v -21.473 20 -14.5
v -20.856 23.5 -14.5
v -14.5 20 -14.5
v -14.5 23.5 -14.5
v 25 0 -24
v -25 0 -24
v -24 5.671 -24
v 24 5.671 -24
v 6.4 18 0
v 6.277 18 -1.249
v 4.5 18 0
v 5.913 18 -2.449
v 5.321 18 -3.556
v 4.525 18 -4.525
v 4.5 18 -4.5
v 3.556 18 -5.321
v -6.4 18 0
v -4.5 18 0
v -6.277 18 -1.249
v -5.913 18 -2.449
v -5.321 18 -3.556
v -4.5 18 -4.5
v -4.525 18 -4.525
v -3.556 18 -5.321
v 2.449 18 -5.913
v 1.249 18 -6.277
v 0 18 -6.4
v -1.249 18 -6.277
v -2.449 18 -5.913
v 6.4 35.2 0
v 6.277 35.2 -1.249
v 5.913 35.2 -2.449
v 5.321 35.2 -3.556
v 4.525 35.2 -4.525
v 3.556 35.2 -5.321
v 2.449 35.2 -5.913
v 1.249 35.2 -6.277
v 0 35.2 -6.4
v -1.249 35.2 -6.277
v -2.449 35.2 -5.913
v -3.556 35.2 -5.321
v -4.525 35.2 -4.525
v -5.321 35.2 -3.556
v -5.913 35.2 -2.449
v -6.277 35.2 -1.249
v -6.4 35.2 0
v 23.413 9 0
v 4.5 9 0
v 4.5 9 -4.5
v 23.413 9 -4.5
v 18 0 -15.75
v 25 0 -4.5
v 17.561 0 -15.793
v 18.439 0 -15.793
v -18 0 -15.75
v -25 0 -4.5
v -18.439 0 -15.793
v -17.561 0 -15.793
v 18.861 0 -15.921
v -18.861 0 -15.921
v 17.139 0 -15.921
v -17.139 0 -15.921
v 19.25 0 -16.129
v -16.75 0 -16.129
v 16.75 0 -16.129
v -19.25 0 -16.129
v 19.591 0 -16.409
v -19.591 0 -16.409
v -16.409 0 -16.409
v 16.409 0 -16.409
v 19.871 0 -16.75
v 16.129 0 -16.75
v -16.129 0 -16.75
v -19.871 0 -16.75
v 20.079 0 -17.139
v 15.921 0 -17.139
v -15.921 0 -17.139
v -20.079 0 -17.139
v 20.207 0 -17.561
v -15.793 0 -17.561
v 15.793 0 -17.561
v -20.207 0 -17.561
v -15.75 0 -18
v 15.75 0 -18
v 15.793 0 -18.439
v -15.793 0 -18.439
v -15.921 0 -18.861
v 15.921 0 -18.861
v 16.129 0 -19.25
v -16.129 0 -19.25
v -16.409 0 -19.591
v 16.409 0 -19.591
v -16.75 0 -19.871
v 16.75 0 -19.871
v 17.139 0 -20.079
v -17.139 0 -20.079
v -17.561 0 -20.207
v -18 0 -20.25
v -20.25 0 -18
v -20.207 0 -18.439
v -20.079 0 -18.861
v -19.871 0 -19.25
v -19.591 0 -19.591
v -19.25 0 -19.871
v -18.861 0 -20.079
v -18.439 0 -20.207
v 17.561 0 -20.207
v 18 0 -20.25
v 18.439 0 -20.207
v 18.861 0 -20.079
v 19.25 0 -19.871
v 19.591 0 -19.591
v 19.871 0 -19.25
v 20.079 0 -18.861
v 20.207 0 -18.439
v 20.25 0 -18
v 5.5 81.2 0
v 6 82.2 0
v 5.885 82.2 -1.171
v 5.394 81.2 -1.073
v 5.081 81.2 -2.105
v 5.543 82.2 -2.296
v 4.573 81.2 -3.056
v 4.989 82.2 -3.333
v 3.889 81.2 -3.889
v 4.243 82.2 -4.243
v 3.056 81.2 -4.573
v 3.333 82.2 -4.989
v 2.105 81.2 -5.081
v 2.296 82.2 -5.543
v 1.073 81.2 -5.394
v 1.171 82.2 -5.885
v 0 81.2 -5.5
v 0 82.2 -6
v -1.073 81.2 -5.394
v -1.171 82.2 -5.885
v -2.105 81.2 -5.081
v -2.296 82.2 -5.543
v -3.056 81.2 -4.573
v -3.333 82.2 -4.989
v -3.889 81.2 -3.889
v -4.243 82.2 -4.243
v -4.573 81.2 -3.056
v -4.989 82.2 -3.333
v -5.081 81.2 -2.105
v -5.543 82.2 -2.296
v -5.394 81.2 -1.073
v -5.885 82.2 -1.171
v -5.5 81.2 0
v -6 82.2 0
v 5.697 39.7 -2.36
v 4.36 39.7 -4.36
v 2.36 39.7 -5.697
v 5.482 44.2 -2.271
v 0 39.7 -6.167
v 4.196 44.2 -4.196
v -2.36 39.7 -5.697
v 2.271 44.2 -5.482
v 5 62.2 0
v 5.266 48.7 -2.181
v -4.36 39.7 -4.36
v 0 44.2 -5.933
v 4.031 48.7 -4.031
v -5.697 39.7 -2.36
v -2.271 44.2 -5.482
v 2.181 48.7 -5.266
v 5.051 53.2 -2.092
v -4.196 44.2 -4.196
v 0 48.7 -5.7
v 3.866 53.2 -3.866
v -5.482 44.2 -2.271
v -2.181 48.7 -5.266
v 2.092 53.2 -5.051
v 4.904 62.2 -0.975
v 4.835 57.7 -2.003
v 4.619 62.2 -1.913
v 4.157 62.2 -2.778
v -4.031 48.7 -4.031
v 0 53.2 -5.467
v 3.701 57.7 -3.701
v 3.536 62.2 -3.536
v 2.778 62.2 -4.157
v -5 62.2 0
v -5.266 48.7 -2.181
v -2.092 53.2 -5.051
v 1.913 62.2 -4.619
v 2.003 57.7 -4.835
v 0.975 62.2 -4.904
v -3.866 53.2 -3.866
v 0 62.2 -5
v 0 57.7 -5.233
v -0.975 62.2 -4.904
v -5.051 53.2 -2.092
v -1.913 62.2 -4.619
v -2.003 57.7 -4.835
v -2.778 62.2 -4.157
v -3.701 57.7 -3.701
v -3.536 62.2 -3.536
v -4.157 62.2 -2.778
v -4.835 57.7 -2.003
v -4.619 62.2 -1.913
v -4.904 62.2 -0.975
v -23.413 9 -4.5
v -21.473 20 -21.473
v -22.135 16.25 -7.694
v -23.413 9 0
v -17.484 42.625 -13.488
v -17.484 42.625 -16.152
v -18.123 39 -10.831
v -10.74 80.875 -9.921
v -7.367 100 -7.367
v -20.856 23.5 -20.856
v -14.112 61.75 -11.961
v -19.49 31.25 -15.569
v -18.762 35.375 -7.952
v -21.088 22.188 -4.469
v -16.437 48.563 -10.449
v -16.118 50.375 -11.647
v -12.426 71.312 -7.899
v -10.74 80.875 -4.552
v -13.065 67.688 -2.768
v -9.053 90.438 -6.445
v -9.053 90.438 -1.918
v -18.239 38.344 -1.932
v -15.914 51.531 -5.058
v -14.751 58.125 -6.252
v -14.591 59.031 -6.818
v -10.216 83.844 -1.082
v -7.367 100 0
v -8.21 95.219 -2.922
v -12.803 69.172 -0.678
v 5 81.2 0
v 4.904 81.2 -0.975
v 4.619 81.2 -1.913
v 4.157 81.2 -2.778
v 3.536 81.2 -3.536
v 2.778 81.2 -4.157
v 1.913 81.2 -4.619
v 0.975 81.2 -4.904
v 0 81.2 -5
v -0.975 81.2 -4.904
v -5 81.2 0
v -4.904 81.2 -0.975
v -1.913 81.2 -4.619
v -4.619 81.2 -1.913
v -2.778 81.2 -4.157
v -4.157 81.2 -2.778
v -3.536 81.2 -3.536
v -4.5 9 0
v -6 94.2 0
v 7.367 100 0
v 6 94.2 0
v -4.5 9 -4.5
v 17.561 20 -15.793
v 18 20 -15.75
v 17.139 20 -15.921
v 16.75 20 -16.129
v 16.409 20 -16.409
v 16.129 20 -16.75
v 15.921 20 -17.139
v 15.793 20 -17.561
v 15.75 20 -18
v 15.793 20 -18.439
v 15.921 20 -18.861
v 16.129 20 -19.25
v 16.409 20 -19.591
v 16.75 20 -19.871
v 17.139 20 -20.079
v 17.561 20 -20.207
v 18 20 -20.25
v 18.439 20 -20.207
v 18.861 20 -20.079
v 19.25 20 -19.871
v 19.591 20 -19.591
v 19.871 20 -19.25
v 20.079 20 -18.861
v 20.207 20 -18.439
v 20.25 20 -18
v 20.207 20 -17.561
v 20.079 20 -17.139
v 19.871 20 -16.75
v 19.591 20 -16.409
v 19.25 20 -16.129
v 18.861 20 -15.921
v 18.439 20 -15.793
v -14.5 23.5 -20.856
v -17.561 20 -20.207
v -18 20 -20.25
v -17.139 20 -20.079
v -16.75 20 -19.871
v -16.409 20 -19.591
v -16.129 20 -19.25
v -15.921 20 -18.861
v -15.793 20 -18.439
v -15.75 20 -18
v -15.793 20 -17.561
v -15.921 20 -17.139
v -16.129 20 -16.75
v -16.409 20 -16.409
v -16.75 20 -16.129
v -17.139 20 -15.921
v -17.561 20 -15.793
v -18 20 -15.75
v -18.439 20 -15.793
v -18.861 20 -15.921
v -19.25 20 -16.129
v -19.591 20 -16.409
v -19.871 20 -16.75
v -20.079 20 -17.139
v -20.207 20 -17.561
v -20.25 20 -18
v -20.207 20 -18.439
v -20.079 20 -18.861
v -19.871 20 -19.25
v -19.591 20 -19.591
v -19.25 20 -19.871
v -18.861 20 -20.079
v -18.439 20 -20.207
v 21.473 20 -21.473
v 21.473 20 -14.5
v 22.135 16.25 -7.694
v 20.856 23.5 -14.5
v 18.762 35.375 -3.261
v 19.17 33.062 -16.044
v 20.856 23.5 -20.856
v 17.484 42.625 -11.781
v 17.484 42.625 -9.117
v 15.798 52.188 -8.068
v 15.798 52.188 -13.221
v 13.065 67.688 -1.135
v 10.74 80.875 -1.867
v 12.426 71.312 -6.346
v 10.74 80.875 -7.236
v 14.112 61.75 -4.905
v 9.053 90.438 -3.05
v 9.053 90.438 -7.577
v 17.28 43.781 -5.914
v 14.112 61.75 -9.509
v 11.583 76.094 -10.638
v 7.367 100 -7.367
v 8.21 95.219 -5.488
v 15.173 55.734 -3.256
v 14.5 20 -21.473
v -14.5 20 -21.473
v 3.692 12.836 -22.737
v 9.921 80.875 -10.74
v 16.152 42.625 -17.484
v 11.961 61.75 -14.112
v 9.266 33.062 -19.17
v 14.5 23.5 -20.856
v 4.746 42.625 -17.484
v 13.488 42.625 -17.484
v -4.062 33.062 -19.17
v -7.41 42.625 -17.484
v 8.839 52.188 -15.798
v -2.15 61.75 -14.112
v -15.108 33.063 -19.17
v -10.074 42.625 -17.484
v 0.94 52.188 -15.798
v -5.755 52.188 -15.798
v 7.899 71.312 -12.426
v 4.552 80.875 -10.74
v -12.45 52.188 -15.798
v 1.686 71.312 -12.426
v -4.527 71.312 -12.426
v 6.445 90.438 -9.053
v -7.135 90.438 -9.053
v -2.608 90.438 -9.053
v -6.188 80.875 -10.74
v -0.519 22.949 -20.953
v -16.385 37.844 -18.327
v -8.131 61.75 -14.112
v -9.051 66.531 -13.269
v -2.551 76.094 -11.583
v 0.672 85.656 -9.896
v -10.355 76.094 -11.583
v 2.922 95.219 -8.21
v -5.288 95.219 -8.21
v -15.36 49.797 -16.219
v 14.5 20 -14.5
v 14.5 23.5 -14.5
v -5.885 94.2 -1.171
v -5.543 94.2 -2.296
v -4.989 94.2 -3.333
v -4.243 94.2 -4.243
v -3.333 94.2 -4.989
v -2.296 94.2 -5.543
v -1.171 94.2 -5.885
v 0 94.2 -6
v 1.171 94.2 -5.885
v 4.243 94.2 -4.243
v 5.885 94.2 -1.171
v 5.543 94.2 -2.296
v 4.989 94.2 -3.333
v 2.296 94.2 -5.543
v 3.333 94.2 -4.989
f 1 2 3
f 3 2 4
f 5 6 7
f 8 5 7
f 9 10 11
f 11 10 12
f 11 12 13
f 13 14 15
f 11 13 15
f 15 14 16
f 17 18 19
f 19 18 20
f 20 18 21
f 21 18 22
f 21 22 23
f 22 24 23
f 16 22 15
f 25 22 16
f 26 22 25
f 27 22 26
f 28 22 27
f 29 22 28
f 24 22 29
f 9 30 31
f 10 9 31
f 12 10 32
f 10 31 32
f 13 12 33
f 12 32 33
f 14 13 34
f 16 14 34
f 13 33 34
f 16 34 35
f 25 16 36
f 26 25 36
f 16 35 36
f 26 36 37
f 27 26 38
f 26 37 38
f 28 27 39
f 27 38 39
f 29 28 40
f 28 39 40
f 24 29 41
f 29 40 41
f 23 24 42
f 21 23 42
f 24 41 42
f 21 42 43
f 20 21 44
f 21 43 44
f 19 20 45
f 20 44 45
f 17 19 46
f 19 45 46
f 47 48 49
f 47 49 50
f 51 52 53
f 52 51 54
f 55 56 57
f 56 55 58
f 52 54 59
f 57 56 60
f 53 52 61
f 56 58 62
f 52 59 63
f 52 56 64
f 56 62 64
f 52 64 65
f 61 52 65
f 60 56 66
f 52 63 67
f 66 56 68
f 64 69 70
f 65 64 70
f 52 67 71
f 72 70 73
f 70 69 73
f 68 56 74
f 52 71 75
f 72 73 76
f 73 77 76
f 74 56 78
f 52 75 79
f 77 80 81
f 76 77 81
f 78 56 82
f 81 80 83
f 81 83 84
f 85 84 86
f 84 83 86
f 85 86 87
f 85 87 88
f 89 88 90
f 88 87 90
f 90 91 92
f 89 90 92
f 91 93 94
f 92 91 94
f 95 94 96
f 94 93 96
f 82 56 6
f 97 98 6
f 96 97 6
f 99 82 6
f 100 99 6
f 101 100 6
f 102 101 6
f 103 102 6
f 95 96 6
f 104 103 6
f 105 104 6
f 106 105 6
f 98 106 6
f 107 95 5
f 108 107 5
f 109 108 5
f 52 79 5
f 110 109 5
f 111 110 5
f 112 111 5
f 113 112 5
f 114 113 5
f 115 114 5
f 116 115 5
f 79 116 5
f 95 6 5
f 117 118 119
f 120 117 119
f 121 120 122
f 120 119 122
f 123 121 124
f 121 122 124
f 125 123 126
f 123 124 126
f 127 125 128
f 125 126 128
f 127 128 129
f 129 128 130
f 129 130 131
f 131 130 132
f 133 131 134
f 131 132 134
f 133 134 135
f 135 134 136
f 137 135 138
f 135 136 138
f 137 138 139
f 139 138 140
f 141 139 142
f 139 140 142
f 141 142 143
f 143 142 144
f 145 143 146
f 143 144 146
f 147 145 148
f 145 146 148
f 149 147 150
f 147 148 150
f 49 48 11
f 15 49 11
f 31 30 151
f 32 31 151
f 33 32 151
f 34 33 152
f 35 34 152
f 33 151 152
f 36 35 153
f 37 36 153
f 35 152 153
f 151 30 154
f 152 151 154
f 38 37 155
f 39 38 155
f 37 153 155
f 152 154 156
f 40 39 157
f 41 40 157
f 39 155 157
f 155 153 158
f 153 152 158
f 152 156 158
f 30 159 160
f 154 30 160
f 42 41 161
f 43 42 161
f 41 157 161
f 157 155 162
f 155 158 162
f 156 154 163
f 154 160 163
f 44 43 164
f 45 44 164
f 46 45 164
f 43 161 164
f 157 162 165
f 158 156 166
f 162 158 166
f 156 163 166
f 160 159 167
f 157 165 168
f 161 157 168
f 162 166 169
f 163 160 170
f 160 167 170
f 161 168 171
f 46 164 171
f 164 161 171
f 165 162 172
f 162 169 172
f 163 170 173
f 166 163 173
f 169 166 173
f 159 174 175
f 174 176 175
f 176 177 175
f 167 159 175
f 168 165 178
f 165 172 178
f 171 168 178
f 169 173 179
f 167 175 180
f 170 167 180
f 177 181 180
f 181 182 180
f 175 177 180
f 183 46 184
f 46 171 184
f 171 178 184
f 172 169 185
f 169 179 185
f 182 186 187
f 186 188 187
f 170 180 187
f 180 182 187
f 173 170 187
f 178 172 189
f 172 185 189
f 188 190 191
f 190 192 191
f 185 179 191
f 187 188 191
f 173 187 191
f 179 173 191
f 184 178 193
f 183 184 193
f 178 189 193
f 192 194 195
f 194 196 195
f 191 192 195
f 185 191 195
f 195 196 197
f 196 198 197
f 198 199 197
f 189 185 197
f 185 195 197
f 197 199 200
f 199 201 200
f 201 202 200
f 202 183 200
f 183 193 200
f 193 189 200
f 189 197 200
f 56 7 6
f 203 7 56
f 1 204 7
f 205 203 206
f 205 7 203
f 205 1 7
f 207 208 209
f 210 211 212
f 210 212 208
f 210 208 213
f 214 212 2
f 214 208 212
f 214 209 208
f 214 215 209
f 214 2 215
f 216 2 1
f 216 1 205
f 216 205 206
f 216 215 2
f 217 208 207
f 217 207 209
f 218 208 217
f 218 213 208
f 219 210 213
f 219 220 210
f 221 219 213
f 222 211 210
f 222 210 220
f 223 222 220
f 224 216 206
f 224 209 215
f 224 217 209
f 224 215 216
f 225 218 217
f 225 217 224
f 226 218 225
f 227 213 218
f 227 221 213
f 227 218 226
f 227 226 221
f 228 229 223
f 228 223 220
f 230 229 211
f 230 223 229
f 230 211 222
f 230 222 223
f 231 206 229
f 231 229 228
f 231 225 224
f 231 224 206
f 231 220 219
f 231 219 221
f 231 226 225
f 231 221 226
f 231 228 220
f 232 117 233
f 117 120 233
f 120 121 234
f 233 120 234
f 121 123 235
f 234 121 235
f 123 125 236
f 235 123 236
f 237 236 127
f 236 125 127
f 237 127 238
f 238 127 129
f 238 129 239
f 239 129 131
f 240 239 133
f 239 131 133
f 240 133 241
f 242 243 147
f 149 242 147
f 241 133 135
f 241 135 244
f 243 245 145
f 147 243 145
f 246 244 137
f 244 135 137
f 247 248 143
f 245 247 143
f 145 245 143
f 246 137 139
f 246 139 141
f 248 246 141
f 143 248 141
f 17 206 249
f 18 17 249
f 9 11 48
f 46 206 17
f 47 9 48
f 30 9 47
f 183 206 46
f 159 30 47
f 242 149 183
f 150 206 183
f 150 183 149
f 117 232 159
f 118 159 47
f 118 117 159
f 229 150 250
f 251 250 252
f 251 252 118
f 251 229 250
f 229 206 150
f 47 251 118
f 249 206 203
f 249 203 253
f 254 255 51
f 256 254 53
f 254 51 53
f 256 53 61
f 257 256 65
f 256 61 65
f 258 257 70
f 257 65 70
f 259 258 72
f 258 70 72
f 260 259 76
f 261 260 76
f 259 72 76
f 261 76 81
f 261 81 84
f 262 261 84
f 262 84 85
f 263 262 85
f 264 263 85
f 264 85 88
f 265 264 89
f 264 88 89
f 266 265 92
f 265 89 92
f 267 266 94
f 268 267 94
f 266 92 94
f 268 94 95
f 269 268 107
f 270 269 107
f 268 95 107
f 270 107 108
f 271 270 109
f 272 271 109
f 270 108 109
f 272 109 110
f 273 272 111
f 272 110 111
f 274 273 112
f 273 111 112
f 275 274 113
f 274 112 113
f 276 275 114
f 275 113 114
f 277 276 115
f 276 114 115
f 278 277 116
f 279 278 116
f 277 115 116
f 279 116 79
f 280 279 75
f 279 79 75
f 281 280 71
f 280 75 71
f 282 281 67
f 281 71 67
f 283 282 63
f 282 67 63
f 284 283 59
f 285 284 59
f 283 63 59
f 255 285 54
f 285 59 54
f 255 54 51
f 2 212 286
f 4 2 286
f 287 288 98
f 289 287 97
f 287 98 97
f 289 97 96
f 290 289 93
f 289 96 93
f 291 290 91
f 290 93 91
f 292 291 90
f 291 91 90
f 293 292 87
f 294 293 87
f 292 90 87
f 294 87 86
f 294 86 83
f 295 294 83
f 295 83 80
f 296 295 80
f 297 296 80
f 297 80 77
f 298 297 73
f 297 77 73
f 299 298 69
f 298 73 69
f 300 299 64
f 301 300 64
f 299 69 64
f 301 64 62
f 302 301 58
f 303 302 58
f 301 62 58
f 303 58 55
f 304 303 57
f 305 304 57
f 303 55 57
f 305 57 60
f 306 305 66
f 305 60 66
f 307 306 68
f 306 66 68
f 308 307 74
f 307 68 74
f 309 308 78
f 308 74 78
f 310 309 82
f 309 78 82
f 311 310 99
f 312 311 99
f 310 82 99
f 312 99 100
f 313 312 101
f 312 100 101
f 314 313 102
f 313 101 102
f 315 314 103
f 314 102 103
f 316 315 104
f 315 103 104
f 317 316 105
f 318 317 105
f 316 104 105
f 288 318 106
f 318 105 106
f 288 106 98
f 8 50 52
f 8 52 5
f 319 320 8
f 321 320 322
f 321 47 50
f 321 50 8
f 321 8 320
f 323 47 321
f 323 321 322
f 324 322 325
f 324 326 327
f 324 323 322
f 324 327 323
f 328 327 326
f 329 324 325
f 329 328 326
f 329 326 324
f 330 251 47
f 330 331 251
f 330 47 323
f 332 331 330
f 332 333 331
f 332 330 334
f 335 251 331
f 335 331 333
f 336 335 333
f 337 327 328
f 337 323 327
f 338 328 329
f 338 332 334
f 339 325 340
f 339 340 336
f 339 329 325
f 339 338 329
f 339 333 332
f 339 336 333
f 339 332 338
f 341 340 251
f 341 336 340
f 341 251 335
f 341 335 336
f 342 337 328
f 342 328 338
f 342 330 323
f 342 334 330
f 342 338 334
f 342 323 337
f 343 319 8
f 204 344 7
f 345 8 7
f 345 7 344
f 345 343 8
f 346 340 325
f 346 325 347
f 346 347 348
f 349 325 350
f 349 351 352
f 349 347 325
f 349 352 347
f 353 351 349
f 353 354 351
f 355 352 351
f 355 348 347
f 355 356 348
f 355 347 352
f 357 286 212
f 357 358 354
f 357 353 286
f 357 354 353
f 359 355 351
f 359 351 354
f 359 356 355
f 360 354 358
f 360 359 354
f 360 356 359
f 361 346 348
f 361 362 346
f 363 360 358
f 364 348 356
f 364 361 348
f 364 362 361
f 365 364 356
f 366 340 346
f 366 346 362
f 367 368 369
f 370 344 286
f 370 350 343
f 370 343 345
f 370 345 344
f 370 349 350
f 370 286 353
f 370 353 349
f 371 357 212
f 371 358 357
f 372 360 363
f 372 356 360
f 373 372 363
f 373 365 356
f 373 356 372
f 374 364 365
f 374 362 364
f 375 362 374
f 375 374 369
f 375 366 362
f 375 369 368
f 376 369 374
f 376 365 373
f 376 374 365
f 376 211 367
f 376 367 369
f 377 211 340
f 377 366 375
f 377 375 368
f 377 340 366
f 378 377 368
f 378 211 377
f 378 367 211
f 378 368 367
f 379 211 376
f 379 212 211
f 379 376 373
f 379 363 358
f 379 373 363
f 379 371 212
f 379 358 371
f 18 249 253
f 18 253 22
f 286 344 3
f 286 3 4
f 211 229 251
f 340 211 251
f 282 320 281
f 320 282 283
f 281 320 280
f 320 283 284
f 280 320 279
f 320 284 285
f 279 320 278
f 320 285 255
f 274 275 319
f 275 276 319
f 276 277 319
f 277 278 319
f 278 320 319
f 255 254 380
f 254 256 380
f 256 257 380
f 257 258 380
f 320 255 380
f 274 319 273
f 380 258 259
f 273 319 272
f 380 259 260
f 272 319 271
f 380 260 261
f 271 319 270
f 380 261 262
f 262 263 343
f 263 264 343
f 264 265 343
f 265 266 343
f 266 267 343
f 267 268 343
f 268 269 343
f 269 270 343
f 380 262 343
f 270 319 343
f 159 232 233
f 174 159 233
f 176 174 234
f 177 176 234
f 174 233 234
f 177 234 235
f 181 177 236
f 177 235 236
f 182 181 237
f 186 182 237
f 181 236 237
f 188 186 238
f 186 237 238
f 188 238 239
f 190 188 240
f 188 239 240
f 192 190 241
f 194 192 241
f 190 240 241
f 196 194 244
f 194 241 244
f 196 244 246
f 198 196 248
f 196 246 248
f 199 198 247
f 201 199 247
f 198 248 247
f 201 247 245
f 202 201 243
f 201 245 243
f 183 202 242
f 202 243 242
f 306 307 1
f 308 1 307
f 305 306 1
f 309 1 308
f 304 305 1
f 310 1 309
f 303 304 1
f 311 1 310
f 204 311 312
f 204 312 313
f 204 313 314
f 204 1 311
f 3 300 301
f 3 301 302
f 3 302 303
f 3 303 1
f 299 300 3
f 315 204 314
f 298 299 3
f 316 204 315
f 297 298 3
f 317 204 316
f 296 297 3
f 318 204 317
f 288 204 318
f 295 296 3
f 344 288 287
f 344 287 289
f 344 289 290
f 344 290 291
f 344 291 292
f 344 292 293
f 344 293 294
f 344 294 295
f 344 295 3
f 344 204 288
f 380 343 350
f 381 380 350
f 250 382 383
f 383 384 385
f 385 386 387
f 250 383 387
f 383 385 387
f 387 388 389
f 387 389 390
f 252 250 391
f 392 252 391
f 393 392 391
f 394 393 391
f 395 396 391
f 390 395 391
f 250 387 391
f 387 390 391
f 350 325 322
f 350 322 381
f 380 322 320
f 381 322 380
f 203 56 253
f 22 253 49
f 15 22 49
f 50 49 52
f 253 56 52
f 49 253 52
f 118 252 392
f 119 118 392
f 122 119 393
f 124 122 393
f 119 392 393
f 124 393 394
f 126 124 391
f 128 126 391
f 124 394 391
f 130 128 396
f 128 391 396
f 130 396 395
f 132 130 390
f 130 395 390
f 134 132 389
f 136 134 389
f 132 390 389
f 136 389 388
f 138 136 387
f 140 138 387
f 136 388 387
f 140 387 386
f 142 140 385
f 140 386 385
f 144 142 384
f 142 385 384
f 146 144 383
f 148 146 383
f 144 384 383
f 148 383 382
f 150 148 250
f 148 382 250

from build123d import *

# Parameters (mm, degrees)
SKETCH_2_W               = 50
SKETCH_2_H               = 50
EXTRUDE_1_DEPTH          = 100
EXTRUDE_1_TAPER          = 10
SKETCH_3_W               = 215.720321278
SKETCH_3_H               = 290.879799434
CUT_EXTRUDE_1_DEPTH      = 107.066017319
SKETCH_7_W               = 4.5
SKETCH_7_H               = 23.792731937
SKETCH_8_W               = 50
SKETCH_8_H               = 4.5
CUT_EXTRUDE_2_DEPTH      = 9
SKETCH_9_W               = 9
SKETCH_9_H               = 9
CUT_EXTRUDE_3_DEPTH      = 4.5
SKETCH_10_W              = 7
SKETCH_10_H              = 3.5
CUT_EXTRUDE_4_DEPTH      = 10.5
SKETCH_11_R              = 2.25
CUT_EXTRUDE_5_DEPTH      = 20
CUT_EXTRUDE_6_DEPTH      = 107.066017319
CUT_EXTRUDE_6_DEPTH_BACK = 107.066017319
SKETCH_12_W              = 75.055418853
SKETCH_12_H              = 23.361905794


with BuildPart() as part:
    # 草圖2 → 填料-伸長1 (new body)
    with BuildSketch(Plane(origin=(0, 0, 0), x_dir=(1, 0, 0), z_dir=(0, 1, 0))):
        Rectangle(SKETCH_2_W, SKETCH_2_H)
    extrude(amount=EXTRUDE_1_DEPTH, taper=EXTRUDE_1_TAPER)

    # 草圖3 → 除料-伸長1 (cut, through all)
    with BuildSketch(Plane.XY):
        Rectangle(SKETCH_3_W, SKETCH_3_H)
    extrude(amount=CUT_EXTRUDE_1_DEPTH, mode=Mode.SUBTRACT)


with BuildPart() as body_2:
    # stick_antenna_434MHz: read off the stored shape, not the designer's step
    # stick_antenna_434MHz outline → stick_antenna_434MHz (revolve)
    with BuildSketch(Plane.XY):
        Polygon((0, 94.2), (0, 23), (3, 23), (3, 18), (6.4, 18), (6.4, 35.2), (5, 62.2), (5, 81.2), (5.5, 81.2), (6, 82.2), (6, 94.2), align=None)
    revolve(axis=Axis((0, 0, 0), (0, 1, 0)))


with BuildPart() as part_1:
    add(part.part)

    # Other 1: read off the stored shape, not the designer's step
    # Other 1: cut body 2
    add(body_2.part, mode=Mode.SUBTRACT)

    # 草圖7 → 除料-旋轉1 (revolve, cut)
    with BuildSketch(Plane.XY):
        with Locations((2.25, 11.896365969)):
            Rectangle(SKETCH_7_W, SKETCH_7_H)
    revolve(axis=Axis((0, 30.263839144, 0), (0, -1, 0)), mode=Mode.SUBTRACT)

    # 草圖8 → 除料-伸長2 (cut)
    with BuildSketch(Plane.XZ):
        with Locations((0, -2.25)):
            Rectangle(SKETCH_8_W, SKETCH_8_H)
    extrude(amount=-CUT_EXTRUDE_2_DEPTH, mode=Mode.SUBTRACT)

    # 草圖9 → 除料-伸長3 (cut)
    with BuildSketch(Plane.XY):
        with Locations((0, 13.5)):
            Rectangle(SKETCH_9_W, SKETCH_9_H)
    extrude(amount=-CUT_EXTRUDE_3_DEPTH, mode=Mode.SUBTRACT)

    # 草圖10 → 除料-伸長4 (cut)
    with BuildSketch(Plane.XY.offset(-25)):
        with Locations((-18, 21.75)):
            Rectangle(SKETCH_10_W, SKETCH_10_H)
    cut_extrude_4 = extrude(amount=CUT_EXTRUDE_4_DEPTH, mode=Mode.SUBTRACT)

    # 草圖11 → 除料-伸長5 (cut)
    with BuildSketch(Plane.XZ):
        with Locations(Location((-18, -18, 0), (0, 0, 270))):
            Circle(SKETCH_11_R)
        with Locations(Location((18, -18, 0), (0, 0, 90))):
            Circle(SKETCH_11_R)
    extrude(amount=-CUT_EXTRUDE_5_DEPTH, mode=Mode.SUBTRACT)

    # 鏡射2: 除料-伸長4 across plane
    add(cut_extrude_4.mirror(Plane(origin=(0, 0, 0), x_dir=(0, 0, 1), z_dir=(1, 0, 0))), mode=Mode.SUBTRACT)

    # 草圖12 → 除料-伸長6 (cut, two sides: drawn at the far end of the back side and taken through both)
    with BuildSketch(Plane(origin=(0, 0, 0), x_dir=(0, 0, -1), z_dir=(1, 0, 0)).offset(-CUT_EXTRUDE_6_DEPTH_BACK)):
        with Locations((61.527709427, 0)):
            Rectangle(SKETCH_12_W, SKETCH_12_H)
    extrude(amount=CUT_EXTRUDE_6_DEPTH + CUT_EXTRUDE_6_DEPTH_BACK, mode=Mode.SUBTRACT)


solid = part_1.part
